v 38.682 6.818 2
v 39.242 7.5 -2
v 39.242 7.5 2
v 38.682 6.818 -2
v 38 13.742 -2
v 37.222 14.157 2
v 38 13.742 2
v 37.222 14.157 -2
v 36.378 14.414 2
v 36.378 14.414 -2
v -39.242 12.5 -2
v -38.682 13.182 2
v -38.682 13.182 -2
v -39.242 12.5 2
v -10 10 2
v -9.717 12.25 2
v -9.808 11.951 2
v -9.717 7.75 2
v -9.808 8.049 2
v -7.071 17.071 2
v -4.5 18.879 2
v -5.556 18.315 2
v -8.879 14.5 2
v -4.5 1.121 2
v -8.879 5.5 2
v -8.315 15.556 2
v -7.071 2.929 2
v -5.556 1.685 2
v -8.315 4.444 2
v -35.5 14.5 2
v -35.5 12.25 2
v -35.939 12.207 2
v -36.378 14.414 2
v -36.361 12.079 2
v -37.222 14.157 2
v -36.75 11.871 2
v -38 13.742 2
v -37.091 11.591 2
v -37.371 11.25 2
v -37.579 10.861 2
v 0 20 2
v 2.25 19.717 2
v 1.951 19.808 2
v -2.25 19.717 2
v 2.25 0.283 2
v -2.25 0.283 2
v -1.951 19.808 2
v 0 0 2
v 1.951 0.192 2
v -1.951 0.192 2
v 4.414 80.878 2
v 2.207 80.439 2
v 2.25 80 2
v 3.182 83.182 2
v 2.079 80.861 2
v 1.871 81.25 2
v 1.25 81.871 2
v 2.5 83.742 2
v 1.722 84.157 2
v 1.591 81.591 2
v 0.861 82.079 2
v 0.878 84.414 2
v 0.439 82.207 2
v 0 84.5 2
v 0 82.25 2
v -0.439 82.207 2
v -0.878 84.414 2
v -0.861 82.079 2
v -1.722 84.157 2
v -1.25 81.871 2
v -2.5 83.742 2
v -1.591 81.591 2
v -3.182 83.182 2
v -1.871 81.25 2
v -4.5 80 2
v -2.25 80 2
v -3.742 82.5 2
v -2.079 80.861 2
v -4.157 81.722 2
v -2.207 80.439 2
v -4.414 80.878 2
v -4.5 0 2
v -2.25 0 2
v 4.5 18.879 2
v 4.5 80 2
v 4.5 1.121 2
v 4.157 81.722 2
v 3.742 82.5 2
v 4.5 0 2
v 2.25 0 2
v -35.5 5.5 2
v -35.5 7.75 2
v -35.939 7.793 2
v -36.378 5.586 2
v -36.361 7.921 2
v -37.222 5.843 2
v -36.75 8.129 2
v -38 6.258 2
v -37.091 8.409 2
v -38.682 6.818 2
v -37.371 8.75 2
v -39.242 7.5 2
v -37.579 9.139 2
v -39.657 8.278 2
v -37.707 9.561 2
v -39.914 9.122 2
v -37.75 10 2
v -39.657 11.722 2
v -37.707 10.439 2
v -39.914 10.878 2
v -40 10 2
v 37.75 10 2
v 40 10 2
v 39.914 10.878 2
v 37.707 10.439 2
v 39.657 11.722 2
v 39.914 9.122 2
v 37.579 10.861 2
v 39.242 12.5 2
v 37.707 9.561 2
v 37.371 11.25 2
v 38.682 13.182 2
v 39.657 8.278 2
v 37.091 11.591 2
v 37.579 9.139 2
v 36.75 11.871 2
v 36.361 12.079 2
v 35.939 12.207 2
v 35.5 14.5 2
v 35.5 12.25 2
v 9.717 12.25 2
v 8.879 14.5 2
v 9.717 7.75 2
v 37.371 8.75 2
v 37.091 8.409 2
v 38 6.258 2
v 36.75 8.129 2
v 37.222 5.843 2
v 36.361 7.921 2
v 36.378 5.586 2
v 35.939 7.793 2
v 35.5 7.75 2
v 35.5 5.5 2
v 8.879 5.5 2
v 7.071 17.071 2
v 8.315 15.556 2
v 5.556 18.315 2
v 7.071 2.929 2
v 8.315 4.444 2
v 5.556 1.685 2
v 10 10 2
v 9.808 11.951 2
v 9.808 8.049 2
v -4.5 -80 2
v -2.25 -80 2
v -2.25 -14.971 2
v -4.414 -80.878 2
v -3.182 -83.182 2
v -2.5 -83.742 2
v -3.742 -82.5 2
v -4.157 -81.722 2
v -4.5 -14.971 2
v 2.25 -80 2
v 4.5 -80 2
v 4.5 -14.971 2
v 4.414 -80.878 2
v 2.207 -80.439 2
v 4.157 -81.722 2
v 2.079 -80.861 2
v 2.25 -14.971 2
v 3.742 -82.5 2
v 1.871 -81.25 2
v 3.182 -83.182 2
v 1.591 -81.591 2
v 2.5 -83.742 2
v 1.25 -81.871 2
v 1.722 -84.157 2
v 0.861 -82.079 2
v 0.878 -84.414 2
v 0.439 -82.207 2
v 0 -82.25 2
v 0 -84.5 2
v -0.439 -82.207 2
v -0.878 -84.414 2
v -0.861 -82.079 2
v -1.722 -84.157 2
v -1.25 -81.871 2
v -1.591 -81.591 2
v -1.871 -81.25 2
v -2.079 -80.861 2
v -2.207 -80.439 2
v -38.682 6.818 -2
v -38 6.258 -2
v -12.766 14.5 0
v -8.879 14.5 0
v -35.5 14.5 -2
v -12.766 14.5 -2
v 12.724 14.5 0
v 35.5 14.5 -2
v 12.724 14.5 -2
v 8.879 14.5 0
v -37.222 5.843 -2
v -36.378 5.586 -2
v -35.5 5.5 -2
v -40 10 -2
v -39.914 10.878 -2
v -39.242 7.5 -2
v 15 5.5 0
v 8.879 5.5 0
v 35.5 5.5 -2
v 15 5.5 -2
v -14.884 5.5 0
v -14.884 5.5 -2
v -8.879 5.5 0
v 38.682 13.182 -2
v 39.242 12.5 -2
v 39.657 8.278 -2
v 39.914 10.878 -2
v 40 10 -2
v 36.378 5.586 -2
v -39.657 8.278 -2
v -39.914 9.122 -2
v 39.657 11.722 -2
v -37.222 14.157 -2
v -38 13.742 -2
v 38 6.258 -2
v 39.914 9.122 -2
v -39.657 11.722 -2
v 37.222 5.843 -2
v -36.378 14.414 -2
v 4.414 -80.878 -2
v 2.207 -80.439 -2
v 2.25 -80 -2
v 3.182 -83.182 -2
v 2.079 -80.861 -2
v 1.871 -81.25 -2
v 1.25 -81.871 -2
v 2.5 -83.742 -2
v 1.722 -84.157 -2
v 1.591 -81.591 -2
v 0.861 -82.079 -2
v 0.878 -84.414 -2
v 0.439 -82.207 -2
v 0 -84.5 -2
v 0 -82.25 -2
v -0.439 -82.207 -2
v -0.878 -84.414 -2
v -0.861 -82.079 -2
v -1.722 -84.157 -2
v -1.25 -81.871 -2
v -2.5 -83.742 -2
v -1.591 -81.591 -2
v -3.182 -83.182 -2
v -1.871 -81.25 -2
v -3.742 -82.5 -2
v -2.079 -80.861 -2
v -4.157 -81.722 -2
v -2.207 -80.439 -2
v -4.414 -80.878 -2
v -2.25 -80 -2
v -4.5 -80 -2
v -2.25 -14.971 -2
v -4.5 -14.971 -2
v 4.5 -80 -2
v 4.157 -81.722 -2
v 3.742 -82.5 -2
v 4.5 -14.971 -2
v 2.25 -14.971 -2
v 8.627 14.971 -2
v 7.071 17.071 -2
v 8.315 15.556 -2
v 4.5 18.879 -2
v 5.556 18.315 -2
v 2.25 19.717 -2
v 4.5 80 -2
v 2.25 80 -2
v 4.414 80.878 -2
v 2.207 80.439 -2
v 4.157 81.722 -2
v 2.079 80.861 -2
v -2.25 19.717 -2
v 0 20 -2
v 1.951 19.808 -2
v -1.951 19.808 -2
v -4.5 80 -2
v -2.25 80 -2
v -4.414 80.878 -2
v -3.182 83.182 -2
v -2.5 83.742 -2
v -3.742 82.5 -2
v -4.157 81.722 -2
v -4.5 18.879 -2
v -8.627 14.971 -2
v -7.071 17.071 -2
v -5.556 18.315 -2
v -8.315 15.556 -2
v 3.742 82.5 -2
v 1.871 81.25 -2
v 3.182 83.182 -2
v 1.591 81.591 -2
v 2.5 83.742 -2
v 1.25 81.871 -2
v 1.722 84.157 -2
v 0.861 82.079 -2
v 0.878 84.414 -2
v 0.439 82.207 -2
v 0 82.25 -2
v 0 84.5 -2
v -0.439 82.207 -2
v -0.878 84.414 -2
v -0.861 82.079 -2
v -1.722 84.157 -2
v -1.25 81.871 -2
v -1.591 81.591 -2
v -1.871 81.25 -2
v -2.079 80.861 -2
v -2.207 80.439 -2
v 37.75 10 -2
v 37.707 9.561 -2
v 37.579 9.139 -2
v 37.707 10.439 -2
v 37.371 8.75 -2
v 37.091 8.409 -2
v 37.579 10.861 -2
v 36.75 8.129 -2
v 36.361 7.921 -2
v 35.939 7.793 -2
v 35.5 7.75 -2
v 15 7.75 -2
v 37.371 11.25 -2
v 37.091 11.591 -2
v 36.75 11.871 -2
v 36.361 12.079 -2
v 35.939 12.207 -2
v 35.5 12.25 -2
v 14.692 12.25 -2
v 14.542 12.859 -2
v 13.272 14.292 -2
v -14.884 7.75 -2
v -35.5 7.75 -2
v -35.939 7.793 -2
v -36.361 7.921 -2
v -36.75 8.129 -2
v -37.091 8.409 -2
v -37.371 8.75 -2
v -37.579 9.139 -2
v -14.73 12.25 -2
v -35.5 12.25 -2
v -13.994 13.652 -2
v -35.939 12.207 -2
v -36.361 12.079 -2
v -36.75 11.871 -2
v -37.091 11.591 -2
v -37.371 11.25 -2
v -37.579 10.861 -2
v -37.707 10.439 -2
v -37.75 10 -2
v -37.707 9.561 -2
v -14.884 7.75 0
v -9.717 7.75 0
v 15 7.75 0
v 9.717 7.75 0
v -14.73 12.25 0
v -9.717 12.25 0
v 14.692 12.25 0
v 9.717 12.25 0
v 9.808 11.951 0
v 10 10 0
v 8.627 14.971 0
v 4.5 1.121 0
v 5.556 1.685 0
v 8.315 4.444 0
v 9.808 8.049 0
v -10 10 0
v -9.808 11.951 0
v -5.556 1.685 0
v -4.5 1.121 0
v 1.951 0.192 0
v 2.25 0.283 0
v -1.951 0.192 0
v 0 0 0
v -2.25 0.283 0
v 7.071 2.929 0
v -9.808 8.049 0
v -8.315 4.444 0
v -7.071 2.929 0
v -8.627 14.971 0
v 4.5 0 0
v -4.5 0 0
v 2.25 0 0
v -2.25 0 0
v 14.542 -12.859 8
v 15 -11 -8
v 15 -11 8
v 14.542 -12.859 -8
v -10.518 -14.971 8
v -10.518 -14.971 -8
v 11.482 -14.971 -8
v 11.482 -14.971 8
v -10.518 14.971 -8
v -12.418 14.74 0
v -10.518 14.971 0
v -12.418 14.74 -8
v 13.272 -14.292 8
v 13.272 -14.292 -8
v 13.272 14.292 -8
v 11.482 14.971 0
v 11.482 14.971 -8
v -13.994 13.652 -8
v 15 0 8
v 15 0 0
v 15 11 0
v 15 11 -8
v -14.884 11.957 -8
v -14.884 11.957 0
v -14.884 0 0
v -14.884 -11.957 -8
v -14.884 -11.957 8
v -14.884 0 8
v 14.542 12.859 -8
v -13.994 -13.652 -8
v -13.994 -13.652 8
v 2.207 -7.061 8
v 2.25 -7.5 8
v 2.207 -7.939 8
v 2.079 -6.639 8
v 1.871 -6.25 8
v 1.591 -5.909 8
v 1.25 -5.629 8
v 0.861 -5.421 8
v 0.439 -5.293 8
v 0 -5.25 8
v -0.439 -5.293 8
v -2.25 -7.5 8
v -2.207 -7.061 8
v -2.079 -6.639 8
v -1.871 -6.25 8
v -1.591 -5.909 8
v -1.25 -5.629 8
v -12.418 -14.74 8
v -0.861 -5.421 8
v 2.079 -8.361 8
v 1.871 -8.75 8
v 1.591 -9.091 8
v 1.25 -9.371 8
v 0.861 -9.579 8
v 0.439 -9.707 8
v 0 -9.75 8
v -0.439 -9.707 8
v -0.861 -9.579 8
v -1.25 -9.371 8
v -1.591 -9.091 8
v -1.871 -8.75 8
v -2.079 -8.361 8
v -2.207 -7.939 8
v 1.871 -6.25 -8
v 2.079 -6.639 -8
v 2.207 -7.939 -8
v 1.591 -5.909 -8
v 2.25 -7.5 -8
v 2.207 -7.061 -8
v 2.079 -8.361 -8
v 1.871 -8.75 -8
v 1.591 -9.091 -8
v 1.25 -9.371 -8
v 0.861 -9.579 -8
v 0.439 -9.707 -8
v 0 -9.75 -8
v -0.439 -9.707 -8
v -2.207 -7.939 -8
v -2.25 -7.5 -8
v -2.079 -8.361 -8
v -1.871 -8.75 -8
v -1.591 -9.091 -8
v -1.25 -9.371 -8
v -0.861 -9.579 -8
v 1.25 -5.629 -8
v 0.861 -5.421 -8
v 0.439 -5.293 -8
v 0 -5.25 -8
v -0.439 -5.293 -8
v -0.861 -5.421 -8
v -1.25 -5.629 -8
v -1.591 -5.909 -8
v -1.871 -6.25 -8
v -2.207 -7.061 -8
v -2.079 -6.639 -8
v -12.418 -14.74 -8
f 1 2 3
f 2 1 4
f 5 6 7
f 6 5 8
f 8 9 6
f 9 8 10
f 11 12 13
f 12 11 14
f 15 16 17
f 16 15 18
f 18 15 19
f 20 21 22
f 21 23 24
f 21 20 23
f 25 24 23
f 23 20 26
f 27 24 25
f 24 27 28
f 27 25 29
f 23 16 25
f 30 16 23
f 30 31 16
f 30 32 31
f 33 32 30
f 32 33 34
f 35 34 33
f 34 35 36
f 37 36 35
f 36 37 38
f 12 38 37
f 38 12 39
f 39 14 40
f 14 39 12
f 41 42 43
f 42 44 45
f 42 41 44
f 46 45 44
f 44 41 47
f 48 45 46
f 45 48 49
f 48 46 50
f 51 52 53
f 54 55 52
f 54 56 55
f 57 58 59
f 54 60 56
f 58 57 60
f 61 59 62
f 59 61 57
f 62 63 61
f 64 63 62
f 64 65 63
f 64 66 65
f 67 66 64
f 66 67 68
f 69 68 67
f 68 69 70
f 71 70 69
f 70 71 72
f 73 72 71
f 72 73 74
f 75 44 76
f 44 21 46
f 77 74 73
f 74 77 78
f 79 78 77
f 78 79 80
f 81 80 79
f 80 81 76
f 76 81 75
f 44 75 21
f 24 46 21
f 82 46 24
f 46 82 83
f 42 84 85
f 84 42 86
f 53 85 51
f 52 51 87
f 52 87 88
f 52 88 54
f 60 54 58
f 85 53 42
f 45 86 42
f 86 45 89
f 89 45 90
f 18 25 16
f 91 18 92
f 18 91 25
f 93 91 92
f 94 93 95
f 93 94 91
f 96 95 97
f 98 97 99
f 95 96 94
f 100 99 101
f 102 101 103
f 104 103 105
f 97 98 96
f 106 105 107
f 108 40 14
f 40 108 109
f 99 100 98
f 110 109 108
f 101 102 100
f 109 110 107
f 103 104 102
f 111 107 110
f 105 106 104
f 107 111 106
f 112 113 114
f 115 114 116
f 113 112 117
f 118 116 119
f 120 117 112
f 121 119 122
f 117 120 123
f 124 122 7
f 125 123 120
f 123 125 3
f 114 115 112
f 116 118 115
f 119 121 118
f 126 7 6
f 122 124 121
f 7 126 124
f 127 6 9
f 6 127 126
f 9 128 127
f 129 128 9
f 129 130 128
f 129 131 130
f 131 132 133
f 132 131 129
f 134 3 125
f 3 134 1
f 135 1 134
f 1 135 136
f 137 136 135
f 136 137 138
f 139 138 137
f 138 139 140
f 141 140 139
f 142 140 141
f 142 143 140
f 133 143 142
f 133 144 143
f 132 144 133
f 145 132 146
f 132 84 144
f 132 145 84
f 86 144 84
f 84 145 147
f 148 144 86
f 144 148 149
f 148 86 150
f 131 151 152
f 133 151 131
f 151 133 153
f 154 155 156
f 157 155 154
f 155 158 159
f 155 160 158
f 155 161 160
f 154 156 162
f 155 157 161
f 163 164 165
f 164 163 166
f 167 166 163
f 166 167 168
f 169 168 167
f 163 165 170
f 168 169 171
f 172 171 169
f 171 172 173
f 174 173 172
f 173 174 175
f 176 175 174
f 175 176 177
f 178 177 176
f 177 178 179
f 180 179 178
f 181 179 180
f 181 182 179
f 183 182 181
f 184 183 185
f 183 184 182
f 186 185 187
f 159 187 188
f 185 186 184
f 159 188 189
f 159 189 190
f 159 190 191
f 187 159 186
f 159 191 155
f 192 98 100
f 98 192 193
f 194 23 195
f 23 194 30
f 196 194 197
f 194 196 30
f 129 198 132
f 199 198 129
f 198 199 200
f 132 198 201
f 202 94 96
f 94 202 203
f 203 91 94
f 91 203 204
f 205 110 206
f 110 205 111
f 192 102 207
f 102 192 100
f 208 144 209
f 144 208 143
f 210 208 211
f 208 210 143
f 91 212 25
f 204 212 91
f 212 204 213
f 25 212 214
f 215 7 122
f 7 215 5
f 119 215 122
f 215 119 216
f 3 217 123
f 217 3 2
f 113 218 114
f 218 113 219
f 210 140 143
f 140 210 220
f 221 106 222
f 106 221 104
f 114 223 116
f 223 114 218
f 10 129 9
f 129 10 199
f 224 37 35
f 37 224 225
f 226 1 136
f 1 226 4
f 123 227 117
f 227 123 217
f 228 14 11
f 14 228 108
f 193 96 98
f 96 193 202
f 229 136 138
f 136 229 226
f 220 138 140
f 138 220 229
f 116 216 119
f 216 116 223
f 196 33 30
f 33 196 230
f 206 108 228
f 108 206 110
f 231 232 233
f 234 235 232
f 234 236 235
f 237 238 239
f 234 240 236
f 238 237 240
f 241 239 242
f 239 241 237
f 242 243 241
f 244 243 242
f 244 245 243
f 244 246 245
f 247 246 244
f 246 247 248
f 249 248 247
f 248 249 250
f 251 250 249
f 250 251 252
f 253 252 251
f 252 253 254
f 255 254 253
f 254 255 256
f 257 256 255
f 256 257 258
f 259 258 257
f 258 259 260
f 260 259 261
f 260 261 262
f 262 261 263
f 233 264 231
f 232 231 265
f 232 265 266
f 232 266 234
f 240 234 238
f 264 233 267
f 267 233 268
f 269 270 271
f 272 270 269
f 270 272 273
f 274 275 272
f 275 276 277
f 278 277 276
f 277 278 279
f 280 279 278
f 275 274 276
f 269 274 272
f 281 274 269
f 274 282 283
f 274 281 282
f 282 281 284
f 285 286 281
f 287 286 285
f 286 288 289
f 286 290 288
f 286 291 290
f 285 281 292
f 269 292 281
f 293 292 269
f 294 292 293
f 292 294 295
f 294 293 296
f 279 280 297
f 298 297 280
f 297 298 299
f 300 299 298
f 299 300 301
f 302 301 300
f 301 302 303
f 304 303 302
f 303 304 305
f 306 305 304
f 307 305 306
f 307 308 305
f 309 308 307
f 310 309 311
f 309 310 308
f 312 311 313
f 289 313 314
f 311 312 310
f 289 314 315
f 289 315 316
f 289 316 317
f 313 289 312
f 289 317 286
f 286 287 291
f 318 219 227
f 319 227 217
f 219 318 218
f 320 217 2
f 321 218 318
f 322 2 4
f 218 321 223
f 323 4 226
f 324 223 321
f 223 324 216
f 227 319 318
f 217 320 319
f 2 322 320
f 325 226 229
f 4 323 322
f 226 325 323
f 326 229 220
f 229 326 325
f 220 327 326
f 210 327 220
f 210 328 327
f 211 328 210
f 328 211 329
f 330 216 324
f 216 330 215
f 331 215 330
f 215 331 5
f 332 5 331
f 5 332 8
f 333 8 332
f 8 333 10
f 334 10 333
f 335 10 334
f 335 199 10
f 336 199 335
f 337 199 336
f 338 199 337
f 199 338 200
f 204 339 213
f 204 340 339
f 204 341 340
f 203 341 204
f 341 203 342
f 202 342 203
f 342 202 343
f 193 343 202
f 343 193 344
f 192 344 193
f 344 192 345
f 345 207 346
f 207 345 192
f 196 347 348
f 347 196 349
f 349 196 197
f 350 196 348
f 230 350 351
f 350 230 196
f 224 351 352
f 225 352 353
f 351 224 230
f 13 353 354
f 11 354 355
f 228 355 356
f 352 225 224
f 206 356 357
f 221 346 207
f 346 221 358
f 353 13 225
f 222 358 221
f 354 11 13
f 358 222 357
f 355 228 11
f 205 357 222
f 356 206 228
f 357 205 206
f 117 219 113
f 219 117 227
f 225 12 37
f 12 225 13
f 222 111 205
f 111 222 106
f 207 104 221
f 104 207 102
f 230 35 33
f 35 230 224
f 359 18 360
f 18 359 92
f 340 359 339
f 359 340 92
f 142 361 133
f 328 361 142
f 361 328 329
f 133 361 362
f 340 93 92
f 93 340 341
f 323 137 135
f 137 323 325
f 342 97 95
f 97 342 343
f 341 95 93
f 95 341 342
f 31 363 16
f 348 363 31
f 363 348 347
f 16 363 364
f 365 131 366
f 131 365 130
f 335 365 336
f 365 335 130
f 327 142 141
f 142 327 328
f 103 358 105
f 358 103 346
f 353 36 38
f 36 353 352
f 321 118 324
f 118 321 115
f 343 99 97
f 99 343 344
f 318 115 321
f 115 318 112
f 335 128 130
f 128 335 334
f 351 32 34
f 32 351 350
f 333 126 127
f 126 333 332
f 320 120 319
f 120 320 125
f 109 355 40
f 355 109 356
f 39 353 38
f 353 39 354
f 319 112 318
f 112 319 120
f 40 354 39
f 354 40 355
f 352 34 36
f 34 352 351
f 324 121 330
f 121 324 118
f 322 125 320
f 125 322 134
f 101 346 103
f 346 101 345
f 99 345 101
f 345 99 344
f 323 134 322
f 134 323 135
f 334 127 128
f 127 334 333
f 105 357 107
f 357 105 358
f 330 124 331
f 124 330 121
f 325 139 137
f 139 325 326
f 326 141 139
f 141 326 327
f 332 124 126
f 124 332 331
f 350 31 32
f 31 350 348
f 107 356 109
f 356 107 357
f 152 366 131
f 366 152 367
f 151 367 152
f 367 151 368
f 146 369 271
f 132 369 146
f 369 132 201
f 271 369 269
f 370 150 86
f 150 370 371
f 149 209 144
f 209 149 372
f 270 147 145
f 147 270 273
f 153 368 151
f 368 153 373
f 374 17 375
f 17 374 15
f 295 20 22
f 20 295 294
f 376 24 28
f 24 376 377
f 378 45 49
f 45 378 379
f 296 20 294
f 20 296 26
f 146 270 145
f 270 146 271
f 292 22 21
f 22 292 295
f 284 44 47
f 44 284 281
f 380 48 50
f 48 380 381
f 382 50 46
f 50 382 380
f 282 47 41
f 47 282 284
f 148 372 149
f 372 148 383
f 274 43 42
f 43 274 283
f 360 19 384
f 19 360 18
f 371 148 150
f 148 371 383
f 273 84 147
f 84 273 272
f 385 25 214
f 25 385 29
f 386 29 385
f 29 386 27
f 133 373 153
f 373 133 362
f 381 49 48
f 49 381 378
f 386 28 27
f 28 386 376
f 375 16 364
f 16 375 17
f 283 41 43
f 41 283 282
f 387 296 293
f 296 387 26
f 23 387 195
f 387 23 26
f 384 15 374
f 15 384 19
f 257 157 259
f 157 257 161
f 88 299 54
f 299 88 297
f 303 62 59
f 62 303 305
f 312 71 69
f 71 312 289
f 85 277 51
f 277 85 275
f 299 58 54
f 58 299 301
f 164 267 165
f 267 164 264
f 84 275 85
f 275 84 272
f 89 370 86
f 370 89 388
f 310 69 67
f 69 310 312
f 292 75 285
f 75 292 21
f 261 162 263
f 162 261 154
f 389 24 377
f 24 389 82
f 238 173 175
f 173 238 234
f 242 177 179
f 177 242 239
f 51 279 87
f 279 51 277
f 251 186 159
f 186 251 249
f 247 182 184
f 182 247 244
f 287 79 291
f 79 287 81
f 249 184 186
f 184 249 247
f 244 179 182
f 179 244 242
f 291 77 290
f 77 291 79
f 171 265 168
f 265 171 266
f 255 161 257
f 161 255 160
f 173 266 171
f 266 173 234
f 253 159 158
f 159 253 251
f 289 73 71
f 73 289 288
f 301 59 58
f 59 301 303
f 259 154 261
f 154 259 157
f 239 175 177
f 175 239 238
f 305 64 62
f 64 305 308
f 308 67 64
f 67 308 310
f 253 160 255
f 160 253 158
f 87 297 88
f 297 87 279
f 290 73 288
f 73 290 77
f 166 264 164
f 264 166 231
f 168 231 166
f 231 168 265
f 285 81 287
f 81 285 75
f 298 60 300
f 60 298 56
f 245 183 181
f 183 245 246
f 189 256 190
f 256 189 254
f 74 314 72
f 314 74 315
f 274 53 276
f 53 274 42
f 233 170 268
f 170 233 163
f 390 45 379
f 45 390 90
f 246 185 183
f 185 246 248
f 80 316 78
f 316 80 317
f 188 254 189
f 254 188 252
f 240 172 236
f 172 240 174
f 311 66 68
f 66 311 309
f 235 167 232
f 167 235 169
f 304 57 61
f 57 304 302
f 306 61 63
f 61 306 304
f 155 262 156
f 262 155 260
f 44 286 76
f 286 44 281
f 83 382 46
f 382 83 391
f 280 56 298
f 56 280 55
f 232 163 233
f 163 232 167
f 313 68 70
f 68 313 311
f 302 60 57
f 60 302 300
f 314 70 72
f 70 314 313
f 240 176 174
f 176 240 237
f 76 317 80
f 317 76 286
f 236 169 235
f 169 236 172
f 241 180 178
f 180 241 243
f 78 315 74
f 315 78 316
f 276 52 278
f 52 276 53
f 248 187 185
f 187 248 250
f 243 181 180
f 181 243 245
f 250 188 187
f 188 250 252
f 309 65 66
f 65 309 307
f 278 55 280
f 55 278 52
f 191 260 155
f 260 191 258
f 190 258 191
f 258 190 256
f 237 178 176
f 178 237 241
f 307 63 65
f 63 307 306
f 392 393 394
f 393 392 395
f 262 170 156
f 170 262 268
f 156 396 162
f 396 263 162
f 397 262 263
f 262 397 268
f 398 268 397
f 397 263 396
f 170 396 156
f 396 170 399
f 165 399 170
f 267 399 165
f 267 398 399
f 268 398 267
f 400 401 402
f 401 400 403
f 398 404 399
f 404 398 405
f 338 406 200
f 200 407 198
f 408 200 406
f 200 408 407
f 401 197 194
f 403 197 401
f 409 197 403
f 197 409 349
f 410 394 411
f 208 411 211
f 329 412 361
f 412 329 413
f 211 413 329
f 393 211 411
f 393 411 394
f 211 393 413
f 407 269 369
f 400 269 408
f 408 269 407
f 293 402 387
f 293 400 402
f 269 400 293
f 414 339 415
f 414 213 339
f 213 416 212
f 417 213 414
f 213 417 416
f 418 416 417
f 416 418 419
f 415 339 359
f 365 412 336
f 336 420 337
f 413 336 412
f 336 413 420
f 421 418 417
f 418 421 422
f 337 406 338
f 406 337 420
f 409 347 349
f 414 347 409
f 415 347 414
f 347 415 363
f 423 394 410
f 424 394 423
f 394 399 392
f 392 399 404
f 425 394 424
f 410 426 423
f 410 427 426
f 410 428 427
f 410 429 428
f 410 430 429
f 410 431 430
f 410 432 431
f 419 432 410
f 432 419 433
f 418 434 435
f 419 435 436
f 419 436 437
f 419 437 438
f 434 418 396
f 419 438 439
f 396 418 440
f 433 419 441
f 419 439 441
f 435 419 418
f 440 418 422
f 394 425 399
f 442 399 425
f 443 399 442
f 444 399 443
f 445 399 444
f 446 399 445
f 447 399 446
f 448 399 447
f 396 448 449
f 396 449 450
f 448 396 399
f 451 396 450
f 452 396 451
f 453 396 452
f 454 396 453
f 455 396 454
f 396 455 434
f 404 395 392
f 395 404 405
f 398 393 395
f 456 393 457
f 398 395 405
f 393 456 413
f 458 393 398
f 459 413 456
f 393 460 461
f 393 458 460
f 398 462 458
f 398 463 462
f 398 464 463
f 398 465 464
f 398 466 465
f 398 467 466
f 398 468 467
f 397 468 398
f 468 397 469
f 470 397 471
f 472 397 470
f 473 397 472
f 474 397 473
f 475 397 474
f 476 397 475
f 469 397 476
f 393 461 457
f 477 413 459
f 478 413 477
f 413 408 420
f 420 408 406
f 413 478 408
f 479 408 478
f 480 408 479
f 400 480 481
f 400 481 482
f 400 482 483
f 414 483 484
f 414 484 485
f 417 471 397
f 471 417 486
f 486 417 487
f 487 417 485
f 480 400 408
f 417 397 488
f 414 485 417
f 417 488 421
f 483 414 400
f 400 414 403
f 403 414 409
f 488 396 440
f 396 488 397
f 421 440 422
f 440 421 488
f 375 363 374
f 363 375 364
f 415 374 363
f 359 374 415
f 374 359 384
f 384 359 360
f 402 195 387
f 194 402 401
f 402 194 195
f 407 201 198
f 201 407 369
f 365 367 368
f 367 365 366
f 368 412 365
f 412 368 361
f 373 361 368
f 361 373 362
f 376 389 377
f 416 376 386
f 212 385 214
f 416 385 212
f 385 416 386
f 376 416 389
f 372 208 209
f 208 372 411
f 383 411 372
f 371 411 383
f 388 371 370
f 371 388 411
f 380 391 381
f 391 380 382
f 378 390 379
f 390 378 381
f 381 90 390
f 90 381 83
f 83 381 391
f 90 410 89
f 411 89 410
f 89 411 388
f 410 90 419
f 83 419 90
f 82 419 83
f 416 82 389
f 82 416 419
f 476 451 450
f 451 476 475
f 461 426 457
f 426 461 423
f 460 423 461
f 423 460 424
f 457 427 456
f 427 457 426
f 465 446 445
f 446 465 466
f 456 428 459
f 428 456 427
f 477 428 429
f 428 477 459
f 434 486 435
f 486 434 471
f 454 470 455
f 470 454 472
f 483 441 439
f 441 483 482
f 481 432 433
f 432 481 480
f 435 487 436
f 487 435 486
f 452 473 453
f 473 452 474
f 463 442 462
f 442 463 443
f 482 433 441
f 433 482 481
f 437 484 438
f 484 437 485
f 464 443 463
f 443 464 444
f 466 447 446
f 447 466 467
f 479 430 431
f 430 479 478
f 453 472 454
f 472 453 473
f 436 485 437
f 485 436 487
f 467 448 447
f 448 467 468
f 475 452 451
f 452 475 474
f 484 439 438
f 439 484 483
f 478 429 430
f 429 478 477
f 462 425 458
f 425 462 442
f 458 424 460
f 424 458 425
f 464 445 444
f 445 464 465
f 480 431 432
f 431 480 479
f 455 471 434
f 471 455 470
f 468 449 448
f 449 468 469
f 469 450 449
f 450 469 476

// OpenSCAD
len_phone = 145;
width_phone = 56;
thickness_phone = 8;
corner_round = 8;

d_screw_m4 = 4.5;
thickness_holder = 4;
append = 15;
w_grip = 30;


holder_set();
//horizontal_block(20);
//vertical_block(len_phone);
//rotate([0, 180, 0])
difference() {
    grip();
    color("red")
    translate([0, w_grip/2, thickness_phone])
    cube([31, w_grip, 2*thickness_phone], center=true);
    
    translate([0, -w_grip/4, 0])
    cylinder(d=d_screw_m4, 3*thickness_phone, center=true, $fn=32);
}


module grip() {
    hull() {
        translate([30/2-corner_round/2, -30/2+corner_round/2, 0])
        cylinder(d=corner_round, 2*thickness_phone, center=true);
        translate([-30/2+corner_round/2, -30/2+corner_round/2, 0])
        cylinder(d=corner_round, 2*thickness_phone, center=true);
        translate([30/2-corner_round/2, 30/2-corner_round/2, 0])
        cylinder(d=corner_round, 2*thickness_phone, center=true);
        translate([-30/2+corner_round/2, 30/2-corner_round/2, 0])
        cylinder(d=corner_round, 2*thickness_phone, center=true);
    }
}


module holder_set() {
    horizontal_block(len_block=width_phone, offset_vertical=10);
    vertical_block(len_block=len_phone);
}

module vertical_block(len_block) {
    len_block = len_block + append;
    difference() {
        
        hull() {
            //translate([0, -len_phone/2, 0])
            translate([0, -len_block/2, 0])
            cylinder(d=9, h=thickness_holder, center=true, $fn=32);
            
            //translate([0, len_phone/2, 0])
            translate([0, len_block/2, 0])
            cylinder(d=9, h=thickness_holder, center=true, $fn=32);
        }
        color("red")
        hull() {
            // translate([0, -len_phone/2, 0])
            translate([0, -len_block/2, 0])
            cylinder(d=d_screw_m4, h=thickness_holder+2, center=true, $fn=32);
            
            // translate([0, len_phone/2, 0])
            translate([0, len_block/2, 0])
            cylinder(d=d_screw_m4, h=thickness_holder+2, center=true, $fn=32);
        }
        
    }
}


module horizontal_block(len_block, offset_vertical) {
  len_block = len_block + append;
  translate([0, offset_vertical, 0])  
  cylinder(d=20, h=thickness_holder, center=true, $fn=32);

  difference() {
    hull() {
        translate([len_block/2, offset_vertical, 0])
        cylinder(d=9, h=thickness_holder, center=true, $fn=32);
        
        translate([-len_block/2, offset_vertical, 0])
        cylinder(d=9, h=thickness_holder, center=true, $fn=32);
    }
    color("red")
    hull() {
        translate([len_block/2, offset_vertical,, 0])
        cylinder(d=d_screw_m4, h=thickness_holder+2, center=true, $fn=32);

        translate([-len_block/2, offset_vertical,, 0])
        cylinder(d=d_screw_m4, h=thickness_holder+2, center=true, $fn=32);
   }
 }
}
